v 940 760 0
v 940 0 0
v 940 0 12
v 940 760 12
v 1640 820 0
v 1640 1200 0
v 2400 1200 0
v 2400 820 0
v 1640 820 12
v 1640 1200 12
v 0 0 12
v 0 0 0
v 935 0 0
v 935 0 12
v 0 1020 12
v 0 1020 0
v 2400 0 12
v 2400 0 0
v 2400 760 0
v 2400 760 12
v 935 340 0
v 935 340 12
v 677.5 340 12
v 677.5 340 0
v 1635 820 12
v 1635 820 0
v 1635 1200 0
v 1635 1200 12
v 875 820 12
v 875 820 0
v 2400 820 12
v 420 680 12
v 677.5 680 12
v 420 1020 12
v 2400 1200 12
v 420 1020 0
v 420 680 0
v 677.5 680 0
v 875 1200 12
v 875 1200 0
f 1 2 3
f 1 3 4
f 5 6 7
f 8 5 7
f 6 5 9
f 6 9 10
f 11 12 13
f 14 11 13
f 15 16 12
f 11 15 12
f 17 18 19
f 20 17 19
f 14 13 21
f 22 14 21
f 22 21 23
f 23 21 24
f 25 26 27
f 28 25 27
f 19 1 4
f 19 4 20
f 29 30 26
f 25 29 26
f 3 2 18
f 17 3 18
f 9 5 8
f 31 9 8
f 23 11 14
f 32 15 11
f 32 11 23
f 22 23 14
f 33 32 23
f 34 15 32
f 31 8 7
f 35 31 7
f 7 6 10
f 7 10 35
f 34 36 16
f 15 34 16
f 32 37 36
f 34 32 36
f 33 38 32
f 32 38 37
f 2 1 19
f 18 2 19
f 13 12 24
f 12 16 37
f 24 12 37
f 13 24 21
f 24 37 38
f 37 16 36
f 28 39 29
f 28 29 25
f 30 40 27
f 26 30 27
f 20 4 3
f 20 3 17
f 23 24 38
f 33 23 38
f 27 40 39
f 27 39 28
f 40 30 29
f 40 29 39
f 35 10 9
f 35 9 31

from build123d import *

# Parameters (mm, degrees)
F0_W     = 1460
F0_H     = 760
F0_W_2   = 760
F0_H_2   = 380
F1_DEPTH = 12


with BuildPart() as f1:
    # F0 (on Top) → F1 (new body)
    with BuildSketch(Plane.XY):
        Polygon((0, 1020), (0, 0), (935, 0), (935, 340), (677.5, 340), (677.5, 680), (420, 680), (420, 1020), align=None)
        with Locations((1670, 380)):
            Rectangle(F0_W, F0_H)
        with Locations((1255, 1010)):
            Rectangle(F0_W_2, F0_H_2)
        with Locations((2020, 1010)):
            Rectangle(F0_W_2, F0_H_2)
    extrude(amount=F1_DEPTH)


solid = f1.part
